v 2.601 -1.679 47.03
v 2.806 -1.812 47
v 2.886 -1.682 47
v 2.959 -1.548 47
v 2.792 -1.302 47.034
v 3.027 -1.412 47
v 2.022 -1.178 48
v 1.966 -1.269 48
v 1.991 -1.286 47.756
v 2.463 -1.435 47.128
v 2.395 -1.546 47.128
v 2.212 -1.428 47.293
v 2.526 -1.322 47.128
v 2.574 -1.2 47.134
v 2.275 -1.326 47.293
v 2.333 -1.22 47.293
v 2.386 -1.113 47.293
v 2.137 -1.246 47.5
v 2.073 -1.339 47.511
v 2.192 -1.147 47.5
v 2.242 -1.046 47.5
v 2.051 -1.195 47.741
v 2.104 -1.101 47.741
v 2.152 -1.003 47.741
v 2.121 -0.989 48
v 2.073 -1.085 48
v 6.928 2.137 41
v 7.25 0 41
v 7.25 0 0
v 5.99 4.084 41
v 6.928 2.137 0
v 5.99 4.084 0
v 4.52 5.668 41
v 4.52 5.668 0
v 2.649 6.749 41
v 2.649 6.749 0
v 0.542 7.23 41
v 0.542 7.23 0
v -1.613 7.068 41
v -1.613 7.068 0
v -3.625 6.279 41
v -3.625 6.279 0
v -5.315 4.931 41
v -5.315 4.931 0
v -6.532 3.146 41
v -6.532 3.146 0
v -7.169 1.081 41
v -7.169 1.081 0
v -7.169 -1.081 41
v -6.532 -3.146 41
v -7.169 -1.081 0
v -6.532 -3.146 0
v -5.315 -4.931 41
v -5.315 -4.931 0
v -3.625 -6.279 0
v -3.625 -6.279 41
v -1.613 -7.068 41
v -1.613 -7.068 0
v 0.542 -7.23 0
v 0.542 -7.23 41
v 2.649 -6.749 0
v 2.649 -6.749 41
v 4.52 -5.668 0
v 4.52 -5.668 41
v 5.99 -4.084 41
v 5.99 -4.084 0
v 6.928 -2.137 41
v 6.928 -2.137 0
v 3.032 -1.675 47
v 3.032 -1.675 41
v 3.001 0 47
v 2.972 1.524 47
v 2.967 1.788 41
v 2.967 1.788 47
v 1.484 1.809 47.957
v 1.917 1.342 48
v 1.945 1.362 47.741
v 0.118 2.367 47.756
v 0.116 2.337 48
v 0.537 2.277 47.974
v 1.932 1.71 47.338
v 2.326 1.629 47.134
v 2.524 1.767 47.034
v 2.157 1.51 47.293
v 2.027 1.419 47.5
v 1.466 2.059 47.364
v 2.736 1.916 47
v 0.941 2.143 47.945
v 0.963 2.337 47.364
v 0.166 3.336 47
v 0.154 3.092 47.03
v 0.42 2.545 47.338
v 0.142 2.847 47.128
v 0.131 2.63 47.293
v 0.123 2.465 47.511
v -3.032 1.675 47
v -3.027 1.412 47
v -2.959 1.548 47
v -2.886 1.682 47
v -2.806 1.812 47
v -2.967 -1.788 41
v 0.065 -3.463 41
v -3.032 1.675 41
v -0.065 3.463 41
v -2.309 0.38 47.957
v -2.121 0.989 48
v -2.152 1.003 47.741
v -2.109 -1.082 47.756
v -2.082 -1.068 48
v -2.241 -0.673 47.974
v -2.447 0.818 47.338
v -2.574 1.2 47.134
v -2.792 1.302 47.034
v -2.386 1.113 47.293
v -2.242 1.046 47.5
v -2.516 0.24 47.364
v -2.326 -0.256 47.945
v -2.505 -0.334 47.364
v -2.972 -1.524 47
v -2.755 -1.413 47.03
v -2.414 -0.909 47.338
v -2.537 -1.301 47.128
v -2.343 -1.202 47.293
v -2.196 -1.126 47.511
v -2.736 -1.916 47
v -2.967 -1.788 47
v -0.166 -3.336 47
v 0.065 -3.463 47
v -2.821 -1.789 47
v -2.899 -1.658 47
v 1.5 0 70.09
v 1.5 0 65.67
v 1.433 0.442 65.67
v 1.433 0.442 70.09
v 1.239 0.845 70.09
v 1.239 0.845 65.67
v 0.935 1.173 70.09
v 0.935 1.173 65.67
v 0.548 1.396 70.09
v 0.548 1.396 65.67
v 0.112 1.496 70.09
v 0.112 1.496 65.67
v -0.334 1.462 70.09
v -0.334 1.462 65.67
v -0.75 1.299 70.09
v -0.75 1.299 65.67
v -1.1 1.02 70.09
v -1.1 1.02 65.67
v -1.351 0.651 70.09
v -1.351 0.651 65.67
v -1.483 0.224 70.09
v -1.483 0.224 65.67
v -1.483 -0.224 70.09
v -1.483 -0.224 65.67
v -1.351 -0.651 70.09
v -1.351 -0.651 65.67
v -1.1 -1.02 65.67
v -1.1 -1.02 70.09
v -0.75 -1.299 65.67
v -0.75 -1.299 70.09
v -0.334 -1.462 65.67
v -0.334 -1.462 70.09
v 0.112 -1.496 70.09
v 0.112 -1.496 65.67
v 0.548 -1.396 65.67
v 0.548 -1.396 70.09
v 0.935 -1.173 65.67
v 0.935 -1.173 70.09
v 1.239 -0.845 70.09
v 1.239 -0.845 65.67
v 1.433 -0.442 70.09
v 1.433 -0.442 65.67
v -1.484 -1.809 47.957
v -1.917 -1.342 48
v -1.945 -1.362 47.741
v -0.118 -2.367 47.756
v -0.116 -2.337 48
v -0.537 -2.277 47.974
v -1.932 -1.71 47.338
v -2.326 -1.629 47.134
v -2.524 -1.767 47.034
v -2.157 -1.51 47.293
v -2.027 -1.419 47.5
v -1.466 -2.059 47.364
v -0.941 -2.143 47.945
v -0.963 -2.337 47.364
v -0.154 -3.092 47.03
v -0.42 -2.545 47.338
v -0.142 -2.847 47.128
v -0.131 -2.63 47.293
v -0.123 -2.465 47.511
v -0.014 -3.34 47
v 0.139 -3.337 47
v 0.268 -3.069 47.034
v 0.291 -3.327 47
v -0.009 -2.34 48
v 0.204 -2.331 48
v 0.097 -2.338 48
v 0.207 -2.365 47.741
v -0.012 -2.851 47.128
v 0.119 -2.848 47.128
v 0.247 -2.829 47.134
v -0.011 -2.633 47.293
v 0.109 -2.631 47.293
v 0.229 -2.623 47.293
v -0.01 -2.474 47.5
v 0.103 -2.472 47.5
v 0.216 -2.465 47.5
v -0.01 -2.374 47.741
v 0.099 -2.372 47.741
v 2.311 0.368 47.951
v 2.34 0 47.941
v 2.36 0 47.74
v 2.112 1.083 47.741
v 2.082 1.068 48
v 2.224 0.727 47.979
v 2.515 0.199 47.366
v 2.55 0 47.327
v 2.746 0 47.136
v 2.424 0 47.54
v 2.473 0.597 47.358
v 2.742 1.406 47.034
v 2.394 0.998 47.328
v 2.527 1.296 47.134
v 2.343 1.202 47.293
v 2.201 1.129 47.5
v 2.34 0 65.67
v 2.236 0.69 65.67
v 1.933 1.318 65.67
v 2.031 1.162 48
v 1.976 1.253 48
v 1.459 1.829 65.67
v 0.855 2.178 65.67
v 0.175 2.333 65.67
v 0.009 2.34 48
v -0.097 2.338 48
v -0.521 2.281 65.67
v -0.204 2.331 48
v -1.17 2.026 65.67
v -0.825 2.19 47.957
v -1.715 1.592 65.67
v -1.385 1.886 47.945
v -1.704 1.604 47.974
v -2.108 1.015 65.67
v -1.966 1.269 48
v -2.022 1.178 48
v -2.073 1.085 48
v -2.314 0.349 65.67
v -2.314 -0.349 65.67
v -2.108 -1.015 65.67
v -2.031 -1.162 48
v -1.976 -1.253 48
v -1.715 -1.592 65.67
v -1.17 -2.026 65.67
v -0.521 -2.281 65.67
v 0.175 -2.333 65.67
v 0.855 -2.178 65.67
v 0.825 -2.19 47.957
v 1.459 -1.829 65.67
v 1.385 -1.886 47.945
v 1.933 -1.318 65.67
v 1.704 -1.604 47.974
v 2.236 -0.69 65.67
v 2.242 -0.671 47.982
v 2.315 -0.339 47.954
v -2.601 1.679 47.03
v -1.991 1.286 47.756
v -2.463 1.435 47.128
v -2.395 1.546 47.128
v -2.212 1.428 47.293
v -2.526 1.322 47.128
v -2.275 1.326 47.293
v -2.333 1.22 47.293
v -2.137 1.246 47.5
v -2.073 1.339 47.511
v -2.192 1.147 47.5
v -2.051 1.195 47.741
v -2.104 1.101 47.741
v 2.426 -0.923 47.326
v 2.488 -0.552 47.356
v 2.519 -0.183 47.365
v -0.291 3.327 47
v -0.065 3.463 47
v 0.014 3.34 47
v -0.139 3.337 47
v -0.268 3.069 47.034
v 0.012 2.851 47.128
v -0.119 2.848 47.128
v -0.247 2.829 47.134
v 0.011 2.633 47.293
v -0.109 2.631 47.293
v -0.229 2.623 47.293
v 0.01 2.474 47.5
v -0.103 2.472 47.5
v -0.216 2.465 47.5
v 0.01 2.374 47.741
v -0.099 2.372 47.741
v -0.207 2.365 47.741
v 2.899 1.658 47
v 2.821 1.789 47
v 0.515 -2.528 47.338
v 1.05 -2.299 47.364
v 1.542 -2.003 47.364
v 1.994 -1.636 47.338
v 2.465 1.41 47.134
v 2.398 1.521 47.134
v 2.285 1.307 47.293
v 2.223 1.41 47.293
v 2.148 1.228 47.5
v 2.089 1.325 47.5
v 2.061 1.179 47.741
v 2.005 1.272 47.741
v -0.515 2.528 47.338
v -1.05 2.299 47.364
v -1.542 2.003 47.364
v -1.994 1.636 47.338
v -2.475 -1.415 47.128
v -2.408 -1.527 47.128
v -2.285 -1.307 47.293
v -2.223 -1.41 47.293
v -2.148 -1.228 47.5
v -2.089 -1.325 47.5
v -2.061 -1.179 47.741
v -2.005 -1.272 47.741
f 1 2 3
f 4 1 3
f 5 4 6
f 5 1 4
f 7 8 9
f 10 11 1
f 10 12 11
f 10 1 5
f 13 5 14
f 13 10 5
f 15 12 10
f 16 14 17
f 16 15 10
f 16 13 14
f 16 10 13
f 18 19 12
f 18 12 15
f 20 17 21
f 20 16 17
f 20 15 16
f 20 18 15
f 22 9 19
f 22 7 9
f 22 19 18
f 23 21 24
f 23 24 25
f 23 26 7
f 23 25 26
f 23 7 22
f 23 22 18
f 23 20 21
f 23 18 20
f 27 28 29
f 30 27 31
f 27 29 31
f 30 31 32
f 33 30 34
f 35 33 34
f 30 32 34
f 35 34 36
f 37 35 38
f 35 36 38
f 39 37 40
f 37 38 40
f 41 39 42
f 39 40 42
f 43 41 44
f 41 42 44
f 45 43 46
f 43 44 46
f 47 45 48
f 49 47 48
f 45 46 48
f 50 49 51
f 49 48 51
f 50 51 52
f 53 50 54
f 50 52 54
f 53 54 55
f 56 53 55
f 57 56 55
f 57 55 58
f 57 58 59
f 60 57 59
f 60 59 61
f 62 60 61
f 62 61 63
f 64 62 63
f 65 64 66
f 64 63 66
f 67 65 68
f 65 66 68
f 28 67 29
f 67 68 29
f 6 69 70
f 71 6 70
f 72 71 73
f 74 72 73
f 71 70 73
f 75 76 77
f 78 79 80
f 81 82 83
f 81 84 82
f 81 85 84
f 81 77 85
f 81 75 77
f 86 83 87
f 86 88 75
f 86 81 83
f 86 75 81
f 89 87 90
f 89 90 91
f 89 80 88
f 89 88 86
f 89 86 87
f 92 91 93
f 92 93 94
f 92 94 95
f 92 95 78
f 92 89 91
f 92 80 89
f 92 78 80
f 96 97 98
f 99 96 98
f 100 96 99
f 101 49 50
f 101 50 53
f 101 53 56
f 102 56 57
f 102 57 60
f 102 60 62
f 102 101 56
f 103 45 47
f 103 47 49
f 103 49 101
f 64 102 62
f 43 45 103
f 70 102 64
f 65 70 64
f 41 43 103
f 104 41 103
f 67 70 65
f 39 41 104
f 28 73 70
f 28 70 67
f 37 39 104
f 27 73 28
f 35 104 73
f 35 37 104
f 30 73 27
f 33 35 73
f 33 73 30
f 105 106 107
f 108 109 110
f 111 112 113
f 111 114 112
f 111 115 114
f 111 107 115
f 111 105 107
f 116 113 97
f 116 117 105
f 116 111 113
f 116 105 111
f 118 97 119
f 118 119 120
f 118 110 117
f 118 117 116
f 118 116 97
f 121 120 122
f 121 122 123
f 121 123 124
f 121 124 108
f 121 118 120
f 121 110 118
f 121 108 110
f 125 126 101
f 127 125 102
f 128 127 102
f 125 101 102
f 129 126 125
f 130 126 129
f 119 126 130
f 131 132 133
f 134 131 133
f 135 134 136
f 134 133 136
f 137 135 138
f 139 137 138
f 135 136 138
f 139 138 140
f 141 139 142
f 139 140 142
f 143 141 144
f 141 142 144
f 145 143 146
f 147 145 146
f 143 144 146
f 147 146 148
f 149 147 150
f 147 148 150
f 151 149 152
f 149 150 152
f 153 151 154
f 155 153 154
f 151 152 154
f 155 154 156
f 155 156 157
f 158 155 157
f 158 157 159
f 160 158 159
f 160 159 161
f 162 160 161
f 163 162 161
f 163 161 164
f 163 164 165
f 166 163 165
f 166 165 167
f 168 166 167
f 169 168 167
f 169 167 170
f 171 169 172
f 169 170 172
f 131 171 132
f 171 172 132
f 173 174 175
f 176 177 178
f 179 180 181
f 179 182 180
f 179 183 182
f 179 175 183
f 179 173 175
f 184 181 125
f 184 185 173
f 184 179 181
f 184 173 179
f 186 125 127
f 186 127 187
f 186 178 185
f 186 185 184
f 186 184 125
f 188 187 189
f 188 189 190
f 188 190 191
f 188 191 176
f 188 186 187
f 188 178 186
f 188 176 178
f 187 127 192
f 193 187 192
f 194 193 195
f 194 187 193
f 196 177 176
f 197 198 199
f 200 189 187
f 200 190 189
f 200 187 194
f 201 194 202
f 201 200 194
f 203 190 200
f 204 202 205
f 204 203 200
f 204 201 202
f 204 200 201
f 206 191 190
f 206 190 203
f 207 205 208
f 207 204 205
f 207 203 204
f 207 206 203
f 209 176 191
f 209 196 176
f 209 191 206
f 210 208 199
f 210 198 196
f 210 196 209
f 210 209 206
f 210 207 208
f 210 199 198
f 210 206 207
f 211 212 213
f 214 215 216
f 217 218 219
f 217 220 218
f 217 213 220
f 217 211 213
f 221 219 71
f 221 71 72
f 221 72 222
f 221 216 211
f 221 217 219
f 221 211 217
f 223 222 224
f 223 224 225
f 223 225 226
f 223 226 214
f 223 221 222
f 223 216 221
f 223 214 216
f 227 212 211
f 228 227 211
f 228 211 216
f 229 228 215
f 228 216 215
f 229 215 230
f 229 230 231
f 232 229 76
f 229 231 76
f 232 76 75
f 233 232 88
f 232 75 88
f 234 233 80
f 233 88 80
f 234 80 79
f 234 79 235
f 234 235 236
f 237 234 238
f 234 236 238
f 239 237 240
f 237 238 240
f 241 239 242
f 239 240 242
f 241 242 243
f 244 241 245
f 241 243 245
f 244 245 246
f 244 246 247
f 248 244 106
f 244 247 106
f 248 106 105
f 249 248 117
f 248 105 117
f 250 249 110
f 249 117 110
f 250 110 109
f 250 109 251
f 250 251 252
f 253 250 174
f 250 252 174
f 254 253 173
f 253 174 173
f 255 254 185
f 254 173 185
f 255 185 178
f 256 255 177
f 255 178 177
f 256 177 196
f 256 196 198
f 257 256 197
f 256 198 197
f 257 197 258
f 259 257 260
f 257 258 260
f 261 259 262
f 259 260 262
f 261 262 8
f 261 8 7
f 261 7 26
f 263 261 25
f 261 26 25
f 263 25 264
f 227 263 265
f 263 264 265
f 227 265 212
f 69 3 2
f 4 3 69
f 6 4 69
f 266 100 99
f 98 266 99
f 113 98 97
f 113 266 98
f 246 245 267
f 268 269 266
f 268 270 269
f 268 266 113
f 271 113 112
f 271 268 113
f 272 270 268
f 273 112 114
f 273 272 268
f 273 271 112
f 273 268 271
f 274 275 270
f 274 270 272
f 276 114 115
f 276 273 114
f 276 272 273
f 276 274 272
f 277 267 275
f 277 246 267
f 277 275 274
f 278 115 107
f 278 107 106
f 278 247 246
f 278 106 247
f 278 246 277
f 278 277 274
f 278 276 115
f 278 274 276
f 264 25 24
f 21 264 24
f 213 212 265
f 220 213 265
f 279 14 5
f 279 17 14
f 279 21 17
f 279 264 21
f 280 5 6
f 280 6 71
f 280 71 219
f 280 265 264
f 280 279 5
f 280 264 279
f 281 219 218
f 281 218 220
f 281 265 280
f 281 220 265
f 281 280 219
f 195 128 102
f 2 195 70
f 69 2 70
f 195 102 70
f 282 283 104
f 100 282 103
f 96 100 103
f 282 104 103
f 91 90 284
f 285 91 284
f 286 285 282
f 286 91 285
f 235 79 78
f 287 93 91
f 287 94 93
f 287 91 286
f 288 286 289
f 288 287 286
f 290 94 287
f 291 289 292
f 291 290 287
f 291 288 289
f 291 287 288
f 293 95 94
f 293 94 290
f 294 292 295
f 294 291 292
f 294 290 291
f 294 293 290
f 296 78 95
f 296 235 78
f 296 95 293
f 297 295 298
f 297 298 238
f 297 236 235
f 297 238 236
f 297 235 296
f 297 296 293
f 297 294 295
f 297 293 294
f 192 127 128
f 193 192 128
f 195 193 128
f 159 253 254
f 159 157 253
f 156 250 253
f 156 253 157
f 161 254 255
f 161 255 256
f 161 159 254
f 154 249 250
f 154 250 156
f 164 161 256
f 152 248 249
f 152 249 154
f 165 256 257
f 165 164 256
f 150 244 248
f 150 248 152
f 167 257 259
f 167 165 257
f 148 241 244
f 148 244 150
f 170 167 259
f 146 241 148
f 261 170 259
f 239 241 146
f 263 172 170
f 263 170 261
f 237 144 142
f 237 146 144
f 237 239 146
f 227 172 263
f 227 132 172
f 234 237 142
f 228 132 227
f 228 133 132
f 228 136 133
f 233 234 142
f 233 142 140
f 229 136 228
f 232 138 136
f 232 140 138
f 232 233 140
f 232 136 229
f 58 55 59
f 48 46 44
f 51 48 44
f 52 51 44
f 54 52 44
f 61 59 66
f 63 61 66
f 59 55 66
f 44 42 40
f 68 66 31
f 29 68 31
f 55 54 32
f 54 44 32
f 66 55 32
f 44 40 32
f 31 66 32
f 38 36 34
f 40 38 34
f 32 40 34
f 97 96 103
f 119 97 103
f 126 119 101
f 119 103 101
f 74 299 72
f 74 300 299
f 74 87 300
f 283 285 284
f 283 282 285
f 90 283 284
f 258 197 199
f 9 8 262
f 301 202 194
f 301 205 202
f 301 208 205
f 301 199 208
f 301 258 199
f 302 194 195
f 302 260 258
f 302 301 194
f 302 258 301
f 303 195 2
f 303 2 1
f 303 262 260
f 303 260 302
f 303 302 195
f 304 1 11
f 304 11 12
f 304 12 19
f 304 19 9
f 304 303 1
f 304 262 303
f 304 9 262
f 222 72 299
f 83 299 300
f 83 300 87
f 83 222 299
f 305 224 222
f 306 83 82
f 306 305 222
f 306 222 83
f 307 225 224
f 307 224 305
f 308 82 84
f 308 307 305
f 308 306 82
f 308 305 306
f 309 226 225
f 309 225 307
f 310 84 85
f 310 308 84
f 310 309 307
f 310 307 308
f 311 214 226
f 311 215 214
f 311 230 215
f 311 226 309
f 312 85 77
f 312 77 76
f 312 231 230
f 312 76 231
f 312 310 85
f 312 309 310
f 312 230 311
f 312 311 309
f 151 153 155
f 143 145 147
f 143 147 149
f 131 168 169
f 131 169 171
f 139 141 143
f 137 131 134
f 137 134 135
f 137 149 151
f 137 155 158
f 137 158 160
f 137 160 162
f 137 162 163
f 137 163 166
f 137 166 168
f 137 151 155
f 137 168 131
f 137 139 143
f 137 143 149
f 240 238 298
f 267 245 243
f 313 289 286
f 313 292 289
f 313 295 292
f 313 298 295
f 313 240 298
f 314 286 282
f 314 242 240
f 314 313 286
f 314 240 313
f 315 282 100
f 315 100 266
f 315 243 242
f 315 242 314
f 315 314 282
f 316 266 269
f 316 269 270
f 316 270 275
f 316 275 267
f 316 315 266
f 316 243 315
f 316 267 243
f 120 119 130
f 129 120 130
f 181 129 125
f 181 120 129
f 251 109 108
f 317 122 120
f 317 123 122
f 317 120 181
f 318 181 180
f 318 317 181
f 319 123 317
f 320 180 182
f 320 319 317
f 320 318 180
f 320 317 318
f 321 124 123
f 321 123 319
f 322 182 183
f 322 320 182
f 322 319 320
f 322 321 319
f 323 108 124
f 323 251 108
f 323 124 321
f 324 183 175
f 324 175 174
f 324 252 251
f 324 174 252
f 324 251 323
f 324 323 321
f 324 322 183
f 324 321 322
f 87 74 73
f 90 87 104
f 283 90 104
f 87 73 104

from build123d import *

# Parameters (mm, degrees)
SKETCH2_R           = 7.25
BOSS_EXTRUDE1_DEPTH = 41
BOSS_EXTRUDE2_DEPTH = 6
SKETCH4_R           = 2.34
BOSS_EXTRUDE3_DEPTH = 18.67
FILLET1_R           = 1
SKETCH5_R           = 1.5
BOSS_EXTRUDE4_DEPTH = 4.42


with BuildPart() as part:
    # Sketch2 → Boss-Extrude1 (new body)
    with BuildSketch(Plane.XY):
        Circle(SKETCH2_R)
    extrude(amount=BOSS_EXTRUDE1_DEPTH)

    # Sketch3 → Boss-Extrude2 (add)
    with BuildSketch(Plane.XY.offset(41)):
        Polygon((3.031985372, -1.675429707), (2.966957375, 1.788061503), (-0.065027998, 3.46349121), (-3.031985372, 1.675429707), (-2.966957375, -1.788061503), (0.065027998, -3.46349121), align=None)
    extrude(amount=BOSS_EXTRUDE2_DEPTH)

    # Sketch4 → Boss-Extrude3 (add)
    with BuildSketch(Plane.XY.offset(47)):
        Circle(SKETCH4_R)
    extrude(amount=BOSS_EXTRUDE3_DEPTH)

    # Fillet1
    fillet1_edges = [part.edges().sort_by_distance(p)[0] for p in [
        (-2.34, 0, 47),
    ]]
    fillet(fillet1_edges, radius=FILLET1_R)

    # Sketch5 → Boss-Extrude4 (add)
    with BuildSketch(Plane.XY.offset(65.67)):
        Circle(SKETCH5_R)
    extrude(amount=BOSS_EXTRUDE4_DEPTH)


solid = part.part
